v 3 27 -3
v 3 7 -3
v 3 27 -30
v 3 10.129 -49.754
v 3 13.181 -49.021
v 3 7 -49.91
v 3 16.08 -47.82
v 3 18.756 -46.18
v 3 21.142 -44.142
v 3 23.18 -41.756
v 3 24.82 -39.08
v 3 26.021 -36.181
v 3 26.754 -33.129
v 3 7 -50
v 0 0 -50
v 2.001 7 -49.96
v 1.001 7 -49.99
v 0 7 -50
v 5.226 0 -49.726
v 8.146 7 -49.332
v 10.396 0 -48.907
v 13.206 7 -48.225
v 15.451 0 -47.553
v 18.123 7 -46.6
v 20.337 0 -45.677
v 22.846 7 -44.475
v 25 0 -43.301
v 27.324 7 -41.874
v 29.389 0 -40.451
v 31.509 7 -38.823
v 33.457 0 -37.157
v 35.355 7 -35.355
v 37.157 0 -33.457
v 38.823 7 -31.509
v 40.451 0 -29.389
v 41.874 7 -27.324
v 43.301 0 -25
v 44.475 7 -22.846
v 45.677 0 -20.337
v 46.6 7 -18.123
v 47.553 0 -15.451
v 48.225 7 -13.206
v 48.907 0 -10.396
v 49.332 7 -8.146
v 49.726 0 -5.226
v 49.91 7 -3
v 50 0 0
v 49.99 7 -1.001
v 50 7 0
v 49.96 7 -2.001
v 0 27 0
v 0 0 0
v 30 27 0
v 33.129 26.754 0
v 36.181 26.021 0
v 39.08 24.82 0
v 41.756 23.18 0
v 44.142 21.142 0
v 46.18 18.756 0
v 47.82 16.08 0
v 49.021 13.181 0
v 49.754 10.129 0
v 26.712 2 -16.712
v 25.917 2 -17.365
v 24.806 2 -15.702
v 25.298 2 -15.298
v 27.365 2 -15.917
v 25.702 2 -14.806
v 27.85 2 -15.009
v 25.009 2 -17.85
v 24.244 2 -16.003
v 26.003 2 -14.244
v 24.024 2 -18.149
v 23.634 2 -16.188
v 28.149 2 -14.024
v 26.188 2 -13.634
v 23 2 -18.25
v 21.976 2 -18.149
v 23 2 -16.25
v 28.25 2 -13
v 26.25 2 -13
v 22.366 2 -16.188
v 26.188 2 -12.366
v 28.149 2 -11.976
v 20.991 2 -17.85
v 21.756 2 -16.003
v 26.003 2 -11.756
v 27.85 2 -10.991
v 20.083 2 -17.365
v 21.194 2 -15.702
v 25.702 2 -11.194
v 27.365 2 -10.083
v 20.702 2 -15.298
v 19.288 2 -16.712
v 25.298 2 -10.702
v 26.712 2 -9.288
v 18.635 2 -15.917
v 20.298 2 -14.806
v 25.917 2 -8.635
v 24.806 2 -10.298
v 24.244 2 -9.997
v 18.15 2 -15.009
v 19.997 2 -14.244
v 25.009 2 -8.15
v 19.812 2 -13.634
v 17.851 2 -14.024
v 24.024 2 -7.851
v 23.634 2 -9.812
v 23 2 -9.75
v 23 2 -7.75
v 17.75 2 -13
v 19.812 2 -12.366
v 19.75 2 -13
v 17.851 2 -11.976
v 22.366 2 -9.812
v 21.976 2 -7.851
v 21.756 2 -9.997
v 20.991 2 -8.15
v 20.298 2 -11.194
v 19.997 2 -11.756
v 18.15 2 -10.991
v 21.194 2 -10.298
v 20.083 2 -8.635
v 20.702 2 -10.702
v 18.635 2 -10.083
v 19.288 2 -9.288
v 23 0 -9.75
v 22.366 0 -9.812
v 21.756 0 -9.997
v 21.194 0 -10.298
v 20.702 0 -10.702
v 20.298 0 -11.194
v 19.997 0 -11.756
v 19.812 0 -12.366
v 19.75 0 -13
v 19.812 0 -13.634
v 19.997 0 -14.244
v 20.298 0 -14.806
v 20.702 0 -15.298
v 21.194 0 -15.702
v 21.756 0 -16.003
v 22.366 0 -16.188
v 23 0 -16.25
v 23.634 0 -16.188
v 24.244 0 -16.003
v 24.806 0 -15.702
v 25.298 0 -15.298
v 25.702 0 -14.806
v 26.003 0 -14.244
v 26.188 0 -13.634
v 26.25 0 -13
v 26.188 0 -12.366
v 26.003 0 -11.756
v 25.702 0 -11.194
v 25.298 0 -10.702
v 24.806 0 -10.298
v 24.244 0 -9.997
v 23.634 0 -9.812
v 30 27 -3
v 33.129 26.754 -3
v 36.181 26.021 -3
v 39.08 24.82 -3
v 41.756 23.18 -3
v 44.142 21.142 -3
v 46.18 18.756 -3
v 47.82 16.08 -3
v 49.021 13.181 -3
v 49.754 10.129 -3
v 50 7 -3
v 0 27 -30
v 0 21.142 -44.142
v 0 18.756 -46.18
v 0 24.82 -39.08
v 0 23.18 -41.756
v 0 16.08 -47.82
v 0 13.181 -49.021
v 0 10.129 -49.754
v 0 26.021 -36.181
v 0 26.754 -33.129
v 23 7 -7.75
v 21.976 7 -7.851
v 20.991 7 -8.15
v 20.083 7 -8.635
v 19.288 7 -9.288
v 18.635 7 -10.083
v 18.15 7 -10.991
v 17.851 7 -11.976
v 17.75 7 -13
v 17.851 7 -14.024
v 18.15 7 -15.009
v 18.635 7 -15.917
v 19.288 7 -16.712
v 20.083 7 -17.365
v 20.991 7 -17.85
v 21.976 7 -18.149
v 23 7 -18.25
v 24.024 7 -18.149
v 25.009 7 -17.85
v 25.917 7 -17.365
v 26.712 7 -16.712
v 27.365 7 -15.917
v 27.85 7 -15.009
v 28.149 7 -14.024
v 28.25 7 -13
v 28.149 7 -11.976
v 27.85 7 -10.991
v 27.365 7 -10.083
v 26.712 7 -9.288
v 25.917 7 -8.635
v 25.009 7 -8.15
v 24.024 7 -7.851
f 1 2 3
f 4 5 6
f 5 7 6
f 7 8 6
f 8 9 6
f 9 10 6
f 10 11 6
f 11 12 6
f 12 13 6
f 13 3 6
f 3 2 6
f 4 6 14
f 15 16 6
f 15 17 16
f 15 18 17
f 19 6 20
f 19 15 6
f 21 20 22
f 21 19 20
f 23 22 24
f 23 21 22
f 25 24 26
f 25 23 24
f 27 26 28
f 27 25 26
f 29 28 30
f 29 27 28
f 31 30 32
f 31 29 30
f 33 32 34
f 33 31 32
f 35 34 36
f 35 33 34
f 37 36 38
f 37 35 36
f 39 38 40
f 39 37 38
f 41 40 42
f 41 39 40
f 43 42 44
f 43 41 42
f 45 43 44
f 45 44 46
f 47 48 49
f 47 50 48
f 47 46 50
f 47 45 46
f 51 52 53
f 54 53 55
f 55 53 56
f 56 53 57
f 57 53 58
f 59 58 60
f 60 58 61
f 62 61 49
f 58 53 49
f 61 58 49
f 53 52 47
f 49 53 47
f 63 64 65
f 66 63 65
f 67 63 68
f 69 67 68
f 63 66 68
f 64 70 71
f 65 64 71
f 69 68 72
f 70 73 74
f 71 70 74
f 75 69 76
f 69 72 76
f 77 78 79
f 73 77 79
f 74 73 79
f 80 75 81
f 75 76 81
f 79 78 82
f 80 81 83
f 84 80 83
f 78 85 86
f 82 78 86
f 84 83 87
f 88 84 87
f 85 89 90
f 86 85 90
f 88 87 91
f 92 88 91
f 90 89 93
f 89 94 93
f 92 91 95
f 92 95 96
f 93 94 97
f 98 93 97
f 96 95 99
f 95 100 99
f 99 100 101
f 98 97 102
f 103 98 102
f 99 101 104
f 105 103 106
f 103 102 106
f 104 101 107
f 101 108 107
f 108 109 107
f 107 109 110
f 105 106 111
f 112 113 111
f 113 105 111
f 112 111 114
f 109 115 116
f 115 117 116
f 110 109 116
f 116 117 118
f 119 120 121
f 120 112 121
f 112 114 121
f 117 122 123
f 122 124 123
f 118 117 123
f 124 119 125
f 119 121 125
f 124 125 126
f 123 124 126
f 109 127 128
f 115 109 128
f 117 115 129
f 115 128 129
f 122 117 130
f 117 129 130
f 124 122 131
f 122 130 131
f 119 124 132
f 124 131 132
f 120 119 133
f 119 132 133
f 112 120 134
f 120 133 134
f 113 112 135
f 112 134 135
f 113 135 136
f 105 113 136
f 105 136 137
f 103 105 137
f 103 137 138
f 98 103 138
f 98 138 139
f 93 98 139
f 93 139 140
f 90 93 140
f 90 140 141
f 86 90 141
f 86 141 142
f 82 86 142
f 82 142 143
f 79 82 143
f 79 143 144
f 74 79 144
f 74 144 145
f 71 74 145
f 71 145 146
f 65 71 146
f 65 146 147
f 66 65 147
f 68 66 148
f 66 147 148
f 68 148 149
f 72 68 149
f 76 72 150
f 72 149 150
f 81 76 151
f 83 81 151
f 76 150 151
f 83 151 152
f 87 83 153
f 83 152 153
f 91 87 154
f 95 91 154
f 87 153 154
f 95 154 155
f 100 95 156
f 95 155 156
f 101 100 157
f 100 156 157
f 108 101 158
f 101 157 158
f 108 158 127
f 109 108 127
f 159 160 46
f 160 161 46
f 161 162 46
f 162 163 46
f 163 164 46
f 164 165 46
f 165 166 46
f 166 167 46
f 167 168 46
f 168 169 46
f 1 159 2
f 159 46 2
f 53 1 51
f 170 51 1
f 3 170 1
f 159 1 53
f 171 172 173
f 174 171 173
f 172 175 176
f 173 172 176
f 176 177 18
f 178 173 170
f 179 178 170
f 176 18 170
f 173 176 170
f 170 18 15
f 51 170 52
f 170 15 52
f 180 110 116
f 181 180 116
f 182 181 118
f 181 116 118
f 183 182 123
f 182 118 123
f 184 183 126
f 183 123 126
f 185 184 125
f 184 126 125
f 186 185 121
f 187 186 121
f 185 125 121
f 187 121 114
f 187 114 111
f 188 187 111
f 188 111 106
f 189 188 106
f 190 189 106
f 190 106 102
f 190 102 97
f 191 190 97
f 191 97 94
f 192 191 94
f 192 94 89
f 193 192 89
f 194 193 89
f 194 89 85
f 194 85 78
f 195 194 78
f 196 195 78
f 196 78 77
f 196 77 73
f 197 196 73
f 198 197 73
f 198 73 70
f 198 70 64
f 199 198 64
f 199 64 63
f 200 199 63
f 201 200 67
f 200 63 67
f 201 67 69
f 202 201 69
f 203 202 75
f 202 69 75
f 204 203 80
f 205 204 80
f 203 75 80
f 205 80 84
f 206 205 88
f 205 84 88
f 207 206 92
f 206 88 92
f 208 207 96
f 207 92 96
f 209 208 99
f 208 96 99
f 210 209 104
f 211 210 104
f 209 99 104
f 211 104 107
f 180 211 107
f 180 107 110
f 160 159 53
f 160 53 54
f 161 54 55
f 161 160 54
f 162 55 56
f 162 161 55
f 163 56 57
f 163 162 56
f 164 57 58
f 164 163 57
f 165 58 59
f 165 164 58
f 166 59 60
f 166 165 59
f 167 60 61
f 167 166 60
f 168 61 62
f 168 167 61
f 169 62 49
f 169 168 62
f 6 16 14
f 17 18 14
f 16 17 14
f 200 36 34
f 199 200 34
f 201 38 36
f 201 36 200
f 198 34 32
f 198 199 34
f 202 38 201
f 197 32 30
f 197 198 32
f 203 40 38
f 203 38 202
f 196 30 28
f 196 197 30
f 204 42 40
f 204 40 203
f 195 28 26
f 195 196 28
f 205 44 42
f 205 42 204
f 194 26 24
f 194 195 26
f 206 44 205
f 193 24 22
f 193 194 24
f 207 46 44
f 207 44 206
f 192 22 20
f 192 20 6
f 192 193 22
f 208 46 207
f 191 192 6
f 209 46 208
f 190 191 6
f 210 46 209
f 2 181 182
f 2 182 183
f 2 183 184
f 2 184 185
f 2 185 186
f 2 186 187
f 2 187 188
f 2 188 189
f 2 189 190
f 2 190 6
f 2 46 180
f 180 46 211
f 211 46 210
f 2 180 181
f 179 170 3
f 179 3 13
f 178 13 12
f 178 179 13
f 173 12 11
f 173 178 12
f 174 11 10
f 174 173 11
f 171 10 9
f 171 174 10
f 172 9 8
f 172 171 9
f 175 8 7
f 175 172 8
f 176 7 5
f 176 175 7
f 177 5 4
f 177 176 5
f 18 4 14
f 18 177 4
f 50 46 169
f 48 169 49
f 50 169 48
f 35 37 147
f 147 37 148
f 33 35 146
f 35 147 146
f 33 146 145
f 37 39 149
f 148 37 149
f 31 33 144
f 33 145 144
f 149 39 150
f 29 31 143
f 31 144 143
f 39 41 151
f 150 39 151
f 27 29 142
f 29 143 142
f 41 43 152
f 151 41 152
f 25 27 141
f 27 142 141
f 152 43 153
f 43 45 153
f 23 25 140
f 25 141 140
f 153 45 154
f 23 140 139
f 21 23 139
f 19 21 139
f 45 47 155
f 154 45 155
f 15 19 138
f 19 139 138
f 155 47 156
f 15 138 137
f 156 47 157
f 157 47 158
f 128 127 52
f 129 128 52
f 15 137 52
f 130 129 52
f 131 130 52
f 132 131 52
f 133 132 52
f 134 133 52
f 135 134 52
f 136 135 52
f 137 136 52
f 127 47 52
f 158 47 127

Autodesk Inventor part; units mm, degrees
ref_plane "YZ Plane" through (0, 0, 0) normal (1, 0, 0) x (0, 1, 0)
ref_plane "XZ Plane" through (0, 0, 0) normal (0, 1, 0) x (-1, 0, 0)
ref_plane "XY Plane" through (0, 0, 0) normal (0, 0, 1) x (1, 0, 0)
sketch "Sketch1" plane through (0, 0, 0) normal (0, 1, 0) x (-1, 0, 0)
  circle A0 centre (0, 0) radius 50
  dimension "d0" = 100
extrude "Extrusion1" add sketch "Sketch1" along normal blind 7
sketch "Sketch2" plane through (0, 7, 0) normal (0, 1, 0) x (1, 0, 0)
  line L0 (0, 0) -> (50, 0)
  line L1 (50, 0) -> (50, 3)
  line L2 (50, 3) -> (0, 3)
  line L3 (0, 3) -> (0, 0)
  dimension "d3" = 50
  dimension "d4" = 3
extrude "Extrusion2" add sketch "Sketch2" along normal blind 20
sketch "Sketch3" plane through (0, 7, 0) normal (0, 1, 0) x (1, 0, 0)
  line L0 (0, 3) -> (0, 0) projected
  line L1 (0, 0) -> (3, 0)
  line L2 (3, 0) -> (3, 50)
  line L3 (3, 50) -> (0, 50)
  line L4 (0, 50) -> (0, 0)
  dimension "d7" = 3
  dimension "d8" = 50
extrude "Extrusion3" add sketch "Sketch3" along normal blind 20
sketch "Sketch4" plane through (0, 7, 0) normal (0, 1, 0) x (1, 0, 0)
  line L0 (0, 0) -> (0, 50) projected
  line L1 (0, 50) -> (-50, 50)
  line L2 (-50, 50) -> (-50, -50)
  line L3 (-50, -50) -> (0, -50)
  line L4 (0, -50) -> (0, 50)
  line L5 (50, 0) -> (0, 0) projected
  line L6 (0, 0) -> (50, 0)
  line L7 (50, 0) -> (50, -50)
  line L8 (50, -50) -> (0, -50)
  line L9 (0, -50) -> (0, 0)
  dimension "d11" = 50
  dimension "d12" = 100
  dimension "d13" = 50
  dimension "d14" = 50
extrude "Extrusion4" cut sketch "Sketch4" against normal blind 7
sketch "Sketch5" plane through (0, 7, 0) normal (0, 1, 0) x (1, 0, 0)
  line L0 (3, 49.9099) -> (3, 3) projected
  line L1 (3, 3) -> (49.9099, 3) projected
  point P0 (0, 0)
  point P1 (23, 13)
  dimension "d24" = 20
  dimension "d25" = 10
hole "Hole1" at (23, 7, -13) direction (0, -1, 0) diameter 6.5 end through all counterbore diameter 10.5 counterbore depth 5
fillet "Fillet1" radius 20 1 edges at (1.5, 27, -50)
fillet "Fillet2" radius 20 1 edges at (50, 27, -1.5)
properties part number "euro_box_corner_r"
